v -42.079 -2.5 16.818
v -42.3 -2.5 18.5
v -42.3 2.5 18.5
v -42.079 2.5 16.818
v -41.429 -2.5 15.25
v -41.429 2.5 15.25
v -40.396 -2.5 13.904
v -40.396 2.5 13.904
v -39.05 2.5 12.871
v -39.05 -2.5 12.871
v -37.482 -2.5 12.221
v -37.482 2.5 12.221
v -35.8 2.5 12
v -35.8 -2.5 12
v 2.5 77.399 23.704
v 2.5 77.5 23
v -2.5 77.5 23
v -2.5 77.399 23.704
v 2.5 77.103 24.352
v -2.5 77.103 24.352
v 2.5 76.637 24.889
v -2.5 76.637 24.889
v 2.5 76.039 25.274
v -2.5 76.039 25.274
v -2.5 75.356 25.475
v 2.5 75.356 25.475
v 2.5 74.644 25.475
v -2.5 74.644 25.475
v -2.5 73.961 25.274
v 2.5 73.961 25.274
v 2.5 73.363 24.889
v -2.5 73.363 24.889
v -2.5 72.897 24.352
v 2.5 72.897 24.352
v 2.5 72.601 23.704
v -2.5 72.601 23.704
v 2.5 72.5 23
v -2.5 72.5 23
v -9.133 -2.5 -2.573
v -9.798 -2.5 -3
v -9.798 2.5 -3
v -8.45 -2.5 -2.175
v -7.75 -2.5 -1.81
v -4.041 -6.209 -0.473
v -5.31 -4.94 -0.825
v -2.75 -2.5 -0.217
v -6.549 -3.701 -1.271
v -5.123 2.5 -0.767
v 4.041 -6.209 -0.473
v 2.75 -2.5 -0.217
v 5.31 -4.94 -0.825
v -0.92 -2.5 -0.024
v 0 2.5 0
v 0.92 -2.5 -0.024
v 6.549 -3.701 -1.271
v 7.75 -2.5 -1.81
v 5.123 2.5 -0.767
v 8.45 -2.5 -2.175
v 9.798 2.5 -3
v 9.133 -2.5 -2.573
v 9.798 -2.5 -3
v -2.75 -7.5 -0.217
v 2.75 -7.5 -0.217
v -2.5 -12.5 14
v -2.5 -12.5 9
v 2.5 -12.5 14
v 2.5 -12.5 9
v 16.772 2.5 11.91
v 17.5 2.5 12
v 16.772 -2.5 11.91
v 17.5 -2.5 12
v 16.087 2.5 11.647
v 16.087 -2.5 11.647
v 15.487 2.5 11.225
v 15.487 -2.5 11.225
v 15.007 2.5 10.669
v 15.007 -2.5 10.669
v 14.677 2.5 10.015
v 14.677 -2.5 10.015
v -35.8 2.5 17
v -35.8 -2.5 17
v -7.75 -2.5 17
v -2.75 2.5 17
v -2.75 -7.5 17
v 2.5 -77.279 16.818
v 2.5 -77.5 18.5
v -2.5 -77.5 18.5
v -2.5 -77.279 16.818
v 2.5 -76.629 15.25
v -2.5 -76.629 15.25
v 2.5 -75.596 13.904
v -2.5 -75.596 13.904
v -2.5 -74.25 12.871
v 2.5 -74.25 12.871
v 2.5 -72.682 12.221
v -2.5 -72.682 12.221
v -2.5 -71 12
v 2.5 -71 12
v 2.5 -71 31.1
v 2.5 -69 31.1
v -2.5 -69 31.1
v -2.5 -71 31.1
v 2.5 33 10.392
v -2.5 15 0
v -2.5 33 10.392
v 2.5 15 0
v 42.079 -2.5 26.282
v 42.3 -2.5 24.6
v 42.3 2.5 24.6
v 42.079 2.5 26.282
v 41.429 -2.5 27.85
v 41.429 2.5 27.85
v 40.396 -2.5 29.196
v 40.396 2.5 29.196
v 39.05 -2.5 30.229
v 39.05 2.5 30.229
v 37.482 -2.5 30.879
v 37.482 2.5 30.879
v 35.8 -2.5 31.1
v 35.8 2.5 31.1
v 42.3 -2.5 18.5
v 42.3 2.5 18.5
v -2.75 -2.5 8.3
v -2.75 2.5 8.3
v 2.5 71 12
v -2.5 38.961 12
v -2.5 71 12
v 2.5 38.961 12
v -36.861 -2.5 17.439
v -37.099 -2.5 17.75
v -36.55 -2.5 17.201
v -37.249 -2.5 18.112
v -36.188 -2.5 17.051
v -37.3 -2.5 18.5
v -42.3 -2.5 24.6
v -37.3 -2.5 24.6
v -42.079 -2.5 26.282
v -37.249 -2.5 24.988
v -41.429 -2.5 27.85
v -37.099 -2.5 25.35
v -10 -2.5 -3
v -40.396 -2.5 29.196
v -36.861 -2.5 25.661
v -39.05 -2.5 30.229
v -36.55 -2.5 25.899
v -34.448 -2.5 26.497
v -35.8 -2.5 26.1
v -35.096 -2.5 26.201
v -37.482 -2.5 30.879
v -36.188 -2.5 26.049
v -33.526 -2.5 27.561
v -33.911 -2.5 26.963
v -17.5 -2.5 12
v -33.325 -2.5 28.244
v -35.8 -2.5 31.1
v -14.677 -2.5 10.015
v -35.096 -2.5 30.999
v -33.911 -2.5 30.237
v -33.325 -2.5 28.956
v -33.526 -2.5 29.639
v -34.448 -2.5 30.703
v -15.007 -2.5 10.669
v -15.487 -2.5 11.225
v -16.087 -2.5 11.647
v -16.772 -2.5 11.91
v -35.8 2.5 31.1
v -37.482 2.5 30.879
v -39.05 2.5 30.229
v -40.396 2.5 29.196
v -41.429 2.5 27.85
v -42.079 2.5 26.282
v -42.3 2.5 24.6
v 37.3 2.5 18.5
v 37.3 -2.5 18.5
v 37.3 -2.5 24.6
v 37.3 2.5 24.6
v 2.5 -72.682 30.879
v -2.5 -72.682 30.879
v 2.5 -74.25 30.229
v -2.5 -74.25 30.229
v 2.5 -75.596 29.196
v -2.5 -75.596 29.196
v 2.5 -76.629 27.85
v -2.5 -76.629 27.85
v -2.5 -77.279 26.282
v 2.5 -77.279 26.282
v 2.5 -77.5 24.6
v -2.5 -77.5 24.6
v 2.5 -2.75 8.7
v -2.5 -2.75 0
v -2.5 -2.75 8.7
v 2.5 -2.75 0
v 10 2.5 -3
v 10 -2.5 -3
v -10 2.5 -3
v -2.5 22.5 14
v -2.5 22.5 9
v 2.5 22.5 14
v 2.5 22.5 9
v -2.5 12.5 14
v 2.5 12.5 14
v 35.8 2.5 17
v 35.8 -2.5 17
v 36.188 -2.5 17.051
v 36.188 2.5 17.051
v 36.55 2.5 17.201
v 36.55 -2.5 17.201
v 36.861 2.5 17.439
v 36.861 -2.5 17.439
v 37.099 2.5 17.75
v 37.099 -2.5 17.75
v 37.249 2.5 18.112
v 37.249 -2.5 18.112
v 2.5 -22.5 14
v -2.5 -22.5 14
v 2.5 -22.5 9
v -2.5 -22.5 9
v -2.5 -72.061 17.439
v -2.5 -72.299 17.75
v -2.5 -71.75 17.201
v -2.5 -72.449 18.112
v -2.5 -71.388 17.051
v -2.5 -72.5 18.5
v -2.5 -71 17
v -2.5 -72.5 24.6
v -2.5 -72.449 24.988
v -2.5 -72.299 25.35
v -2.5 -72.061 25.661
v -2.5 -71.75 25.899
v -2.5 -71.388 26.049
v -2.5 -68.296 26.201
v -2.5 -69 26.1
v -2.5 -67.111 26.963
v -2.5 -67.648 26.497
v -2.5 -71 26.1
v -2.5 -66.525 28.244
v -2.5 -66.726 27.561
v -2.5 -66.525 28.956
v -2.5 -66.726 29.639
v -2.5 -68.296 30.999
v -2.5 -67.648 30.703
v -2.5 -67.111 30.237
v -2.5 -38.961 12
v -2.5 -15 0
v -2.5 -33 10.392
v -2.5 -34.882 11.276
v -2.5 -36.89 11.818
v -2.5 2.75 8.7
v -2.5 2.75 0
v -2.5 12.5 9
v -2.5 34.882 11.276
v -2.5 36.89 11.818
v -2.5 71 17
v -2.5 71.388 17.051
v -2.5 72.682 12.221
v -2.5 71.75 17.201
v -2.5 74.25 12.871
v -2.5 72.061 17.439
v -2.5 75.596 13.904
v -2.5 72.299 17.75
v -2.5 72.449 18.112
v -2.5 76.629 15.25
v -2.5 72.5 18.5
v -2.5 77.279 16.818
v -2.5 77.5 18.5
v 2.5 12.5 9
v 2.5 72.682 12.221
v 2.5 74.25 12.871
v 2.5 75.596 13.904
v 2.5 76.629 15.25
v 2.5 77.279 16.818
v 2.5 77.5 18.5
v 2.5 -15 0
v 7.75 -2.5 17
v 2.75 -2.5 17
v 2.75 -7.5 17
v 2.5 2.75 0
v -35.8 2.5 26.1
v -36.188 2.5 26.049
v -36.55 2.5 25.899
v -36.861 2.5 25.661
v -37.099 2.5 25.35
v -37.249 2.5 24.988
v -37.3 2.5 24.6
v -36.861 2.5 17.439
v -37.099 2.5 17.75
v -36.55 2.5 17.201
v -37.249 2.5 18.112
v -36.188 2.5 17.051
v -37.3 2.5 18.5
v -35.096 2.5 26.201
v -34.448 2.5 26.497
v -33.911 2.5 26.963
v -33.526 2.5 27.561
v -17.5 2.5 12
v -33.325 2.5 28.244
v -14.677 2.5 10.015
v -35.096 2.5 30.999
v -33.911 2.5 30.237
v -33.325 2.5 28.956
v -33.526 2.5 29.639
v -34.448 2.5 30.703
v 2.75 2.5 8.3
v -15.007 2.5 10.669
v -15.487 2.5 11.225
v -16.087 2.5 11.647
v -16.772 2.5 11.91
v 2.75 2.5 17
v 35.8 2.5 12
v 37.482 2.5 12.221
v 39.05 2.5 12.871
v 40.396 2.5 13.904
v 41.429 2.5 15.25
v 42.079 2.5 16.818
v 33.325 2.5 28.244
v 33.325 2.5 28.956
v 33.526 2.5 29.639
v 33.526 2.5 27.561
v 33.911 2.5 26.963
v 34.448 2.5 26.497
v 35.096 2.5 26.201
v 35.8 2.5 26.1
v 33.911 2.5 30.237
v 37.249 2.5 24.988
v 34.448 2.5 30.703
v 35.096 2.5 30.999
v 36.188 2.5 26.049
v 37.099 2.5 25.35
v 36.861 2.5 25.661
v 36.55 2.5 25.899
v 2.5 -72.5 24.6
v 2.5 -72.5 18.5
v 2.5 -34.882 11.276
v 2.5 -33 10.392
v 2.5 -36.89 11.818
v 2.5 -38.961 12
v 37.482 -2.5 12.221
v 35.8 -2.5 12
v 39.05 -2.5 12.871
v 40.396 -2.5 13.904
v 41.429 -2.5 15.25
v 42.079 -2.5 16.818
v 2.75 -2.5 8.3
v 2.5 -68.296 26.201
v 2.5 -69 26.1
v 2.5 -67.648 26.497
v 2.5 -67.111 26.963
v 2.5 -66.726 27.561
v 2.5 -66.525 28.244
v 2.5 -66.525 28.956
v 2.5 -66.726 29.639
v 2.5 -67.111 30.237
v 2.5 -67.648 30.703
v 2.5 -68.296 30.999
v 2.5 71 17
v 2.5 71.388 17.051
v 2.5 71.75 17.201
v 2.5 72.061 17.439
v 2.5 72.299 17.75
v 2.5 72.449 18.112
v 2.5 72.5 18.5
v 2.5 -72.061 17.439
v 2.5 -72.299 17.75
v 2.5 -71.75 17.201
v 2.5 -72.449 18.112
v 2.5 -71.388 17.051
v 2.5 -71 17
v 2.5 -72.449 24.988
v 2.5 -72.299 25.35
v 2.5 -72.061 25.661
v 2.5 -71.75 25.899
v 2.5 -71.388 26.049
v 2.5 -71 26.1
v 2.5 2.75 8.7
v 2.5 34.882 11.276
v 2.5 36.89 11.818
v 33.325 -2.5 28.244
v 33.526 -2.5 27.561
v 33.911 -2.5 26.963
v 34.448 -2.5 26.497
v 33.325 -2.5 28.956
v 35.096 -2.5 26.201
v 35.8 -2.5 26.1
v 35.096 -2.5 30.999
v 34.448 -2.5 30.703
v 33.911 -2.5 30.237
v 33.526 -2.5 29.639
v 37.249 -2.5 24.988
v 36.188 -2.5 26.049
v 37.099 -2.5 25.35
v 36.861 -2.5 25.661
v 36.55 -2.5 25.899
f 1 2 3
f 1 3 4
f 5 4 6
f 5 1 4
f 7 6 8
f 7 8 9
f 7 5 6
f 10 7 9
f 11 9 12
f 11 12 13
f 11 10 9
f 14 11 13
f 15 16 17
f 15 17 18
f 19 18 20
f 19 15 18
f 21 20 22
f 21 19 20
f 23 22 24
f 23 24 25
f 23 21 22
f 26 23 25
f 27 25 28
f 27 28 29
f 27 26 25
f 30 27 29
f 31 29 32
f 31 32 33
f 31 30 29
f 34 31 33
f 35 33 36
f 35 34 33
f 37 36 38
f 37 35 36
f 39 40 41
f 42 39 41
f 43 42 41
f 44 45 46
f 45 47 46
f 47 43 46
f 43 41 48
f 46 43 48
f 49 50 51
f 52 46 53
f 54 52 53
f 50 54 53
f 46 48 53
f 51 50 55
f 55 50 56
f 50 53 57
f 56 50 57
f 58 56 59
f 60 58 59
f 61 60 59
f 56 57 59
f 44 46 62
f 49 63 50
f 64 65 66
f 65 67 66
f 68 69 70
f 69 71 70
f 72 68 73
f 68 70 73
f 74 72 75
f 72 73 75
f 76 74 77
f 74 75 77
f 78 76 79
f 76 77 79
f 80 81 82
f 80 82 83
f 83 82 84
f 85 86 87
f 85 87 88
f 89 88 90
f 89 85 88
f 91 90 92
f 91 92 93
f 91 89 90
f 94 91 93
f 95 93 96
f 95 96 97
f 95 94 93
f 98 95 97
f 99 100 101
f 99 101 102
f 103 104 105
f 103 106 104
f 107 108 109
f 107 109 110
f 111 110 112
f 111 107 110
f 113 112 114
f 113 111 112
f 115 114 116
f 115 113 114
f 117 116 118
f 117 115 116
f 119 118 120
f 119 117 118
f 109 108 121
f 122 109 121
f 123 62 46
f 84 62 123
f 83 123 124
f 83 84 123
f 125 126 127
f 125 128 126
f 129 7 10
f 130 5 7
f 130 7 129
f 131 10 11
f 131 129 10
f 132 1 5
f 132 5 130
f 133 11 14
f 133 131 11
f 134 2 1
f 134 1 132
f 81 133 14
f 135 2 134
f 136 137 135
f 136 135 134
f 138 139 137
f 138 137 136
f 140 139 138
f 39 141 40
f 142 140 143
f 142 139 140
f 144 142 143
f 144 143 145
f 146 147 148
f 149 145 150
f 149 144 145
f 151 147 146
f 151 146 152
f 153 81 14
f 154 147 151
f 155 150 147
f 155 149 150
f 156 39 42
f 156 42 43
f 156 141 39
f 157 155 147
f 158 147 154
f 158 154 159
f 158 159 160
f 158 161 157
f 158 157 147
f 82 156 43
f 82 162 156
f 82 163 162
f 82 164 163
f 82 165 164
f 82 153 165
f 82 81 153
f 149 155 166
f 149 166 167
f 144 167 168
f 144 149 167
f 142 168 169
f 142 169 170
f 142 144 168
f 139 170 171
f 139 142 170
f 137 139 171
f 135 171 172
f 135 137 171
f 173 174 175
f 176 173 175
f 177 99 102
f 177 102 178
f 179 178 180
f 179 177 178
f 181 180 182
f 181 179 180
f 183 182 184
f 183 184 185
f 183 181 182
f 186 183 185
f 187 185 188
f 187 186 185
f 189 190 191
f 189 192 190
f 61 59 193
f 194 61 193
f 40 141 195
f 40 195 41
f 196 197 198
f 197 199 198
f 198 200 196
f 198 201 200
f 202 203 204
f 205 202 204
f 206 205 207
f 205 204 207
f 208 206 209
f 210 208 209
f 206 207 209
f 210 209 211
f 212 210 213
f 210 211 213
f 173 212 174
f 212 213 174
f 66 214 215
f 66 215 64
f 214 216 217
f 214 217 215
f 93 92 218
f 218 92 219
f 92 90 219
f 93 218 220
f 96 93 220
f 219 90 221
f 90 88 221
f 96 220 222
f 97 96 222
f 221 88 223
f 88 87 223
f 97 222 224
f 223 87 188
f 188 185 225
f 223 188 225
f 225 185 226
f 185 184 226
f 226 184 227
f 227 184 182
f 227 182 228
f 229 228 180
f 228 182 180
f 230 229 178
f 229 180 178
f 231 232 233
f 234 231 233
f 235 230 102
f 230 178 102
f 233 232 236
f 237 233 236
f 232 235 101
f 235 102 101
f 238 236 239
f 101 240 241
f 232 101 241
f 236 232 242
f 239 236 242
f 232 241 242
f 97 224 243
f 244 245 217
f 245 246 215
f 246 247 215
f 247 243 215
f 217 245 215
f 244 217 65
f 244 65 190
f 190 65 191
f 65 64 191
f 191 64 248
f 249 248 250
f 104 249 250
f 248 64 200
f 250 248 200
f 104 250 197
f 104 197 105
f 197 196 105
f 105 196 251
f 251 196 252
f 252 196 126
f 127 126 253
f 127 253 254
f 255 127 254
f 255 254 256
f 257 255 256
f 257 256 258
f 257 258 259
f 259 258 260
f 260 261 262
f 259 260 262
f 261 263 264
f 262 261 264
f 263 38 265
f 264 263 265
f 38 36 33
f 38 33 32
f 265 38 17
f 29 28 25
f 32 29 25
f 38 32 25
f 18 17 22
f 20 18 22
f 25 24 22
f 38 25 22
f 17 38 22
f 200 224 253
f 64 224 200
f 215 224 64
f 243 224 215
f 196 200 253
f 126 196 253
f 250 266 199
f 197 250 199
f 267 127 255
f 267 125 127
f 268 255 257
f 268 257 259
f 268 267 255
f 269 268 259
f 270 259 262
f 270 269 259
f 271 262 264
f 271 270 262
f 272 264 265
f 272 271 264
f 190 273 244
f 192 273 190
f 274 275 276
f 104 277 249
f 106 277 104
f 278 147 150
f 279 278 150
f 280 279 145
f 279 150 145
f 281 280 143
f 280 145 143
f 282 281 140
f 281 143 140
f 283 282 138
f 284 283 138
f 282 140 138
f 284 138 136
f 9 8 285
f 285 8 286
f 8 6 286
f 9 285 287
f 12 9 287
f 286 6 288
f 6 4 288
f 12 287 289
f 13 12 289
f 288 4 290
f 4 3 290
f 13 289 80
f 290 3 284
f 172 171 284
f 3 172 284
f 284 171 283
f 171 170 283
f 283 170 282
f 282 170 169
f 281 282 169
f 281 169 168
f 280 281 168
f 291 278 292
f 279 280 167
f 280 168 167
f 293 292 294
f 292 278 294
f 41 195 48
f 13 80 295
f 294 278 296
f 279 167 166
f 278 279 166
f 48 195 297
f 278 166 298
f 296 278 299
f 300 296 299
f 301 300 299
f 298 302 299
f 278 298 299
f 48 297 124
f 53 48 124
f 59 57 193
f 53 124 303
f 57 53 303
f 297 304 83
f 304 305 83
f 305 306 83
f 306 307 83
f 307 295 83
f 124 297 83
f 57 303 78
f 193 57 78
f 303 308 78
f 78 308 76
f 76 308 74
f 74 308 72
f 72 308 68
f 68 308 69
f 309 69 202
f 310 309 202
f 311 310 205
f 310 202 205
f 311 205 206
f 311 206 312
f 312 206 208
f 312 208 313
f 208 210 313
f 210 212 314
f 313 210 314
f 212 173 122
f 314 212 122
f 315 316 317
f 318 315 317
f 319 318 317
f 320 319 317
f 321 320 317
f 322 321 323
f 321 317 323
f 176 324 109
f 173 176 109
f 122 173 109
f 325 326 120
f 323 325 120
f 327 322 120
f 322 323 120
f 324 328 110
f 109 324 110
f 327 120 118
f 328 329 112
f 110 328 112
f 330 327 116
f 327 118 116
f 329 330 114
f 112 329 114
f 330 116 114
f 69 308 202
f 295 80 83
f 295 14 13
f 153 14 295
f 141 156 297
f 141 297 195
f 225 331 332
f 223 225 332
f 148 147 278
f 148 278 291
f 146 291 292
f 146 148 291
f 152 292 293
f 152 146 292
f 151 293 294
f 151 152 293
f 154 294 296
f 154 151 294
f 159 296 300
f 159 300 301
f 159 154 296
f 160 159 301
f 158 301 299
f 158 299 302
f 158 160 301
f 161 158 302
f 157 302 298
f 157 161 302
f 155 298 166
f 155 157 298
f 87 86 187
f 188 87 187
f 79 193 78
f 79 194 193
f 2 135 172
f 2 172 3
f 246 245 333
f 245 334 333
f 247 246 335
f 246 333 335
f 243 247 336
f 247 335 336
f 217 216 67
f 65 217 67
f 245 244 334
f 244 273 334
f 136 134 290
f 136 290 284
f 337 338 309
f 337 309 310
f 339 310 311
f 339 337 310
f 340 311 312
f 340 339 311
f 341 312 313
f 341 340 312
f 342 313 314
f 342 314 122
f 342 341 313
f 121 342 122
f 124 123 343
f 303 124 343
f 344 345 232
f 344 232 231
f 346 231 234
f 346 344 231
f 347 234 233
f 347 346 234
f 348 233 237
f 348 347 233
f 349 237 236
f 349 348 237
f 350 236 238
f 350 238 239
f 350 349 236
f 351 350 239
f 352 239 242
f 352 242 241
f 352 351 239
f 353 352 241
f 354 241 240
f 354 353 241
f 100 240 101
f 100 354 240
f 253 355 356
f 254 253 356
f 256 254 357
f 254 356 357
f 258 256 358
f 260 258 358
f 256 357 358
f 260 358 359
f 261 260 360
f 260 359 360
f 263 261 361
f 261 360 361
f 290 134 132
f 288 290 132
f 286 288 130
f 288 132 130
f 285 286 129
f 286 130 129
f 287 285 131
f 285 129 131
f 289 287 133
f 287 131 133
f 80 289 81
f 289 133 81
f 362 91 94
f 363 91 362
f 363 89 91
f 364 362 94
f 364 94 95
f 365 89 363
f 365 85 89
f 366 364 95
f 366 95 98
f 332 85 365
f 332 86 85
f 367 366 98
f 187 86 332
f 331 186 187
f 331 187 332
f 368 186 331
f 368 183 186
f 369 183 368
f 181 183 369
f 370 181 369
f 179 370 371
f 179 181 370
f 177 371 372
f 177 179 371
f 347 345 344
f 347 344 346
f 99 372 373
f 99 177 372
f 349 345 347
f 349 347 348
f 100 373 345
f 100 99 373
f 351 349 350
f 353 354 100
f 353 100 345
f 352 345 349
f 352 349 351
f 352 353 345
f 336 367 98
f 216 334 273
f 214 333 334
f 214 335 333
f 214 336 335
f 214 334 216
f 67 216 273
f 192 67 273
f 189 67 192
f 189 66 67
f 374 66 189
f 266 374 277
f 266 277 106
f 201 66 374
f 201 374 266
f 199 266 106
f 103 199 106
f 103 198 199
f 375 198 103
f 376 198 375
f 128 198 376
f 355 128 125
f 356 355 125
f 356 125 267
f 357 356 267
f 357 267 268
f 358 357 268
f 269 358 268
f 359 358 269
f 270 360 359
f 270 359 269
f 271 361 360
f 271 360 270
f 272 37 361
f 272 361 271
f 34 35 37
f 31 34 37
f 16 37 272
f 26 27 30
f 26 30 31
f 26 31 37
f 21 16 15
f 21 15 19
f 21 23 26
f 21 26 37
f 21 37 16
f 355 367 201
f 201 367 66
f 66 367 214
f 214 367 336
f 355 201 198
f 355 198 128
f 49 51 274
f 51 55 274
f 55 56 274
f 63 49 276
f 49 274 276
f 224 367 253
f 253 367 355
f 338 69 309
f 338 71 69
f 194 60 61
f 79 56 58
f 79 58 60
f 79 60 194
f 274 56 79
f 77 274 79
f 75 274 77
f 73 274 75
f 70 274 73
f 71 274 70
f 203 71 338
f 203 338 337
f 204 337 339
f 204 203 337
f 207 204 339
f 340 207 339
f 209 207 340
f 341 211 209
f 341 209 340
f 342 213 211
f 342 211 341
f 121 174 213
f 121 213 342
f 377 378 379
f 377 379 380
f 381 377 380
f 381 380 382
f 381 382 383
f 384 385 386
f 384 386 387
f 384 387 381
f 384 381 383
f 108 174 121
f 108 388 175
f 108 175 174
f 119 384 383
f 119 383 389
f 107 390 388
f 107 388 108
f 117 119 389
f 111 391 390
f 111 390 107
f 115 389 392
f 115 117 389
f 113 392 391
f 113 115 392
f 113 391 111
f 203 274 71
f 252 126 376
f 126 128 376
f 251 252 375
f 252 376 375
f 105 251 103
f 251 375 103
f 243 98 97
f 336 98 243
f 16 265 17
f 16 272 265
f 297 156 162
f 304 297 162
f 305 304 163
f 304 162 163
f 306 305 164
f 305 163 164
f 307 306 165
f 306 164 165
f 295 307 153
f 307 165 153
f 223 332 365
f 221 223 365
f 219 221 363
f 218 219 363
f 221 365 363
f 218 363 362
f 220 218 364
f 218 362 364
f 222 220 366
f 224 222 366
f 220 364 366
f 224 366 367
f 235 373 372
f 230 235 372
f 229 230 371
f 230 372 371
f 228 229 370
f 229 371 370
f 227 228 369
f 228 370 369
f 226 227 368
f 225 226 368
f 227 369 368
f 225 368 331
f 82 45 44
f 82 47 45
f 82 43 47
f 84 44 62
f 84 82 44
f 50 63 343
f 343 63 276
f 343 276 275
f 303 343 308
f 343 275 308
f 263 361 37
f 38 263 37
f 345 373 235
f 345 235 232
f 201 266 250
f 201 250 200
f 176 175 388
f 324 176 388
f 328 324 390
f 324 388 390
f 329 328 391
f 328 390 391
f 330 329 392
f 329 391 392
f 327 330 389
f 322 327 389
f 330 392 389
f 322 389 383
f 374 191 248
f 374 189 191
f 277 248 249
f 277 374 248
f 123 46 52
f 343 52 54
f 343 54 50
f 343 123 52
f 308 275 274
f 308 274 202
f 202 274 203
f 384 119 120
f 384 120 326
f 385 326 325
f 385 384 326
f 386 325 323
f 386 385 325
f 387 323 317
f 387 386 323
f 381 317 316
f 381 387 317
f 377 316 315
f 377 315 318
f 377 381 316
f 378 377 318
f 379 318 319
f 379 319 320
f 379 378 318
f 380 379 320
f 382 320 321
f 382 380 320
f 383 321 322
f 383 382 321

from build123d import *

# Parameters (mm, degrees)
SKETCH_W     = 10
SKETCH_H     = 5
PAD_DEPTH    = 2.5
PAD001_DEPTH = 2.5
PAD002_DEPTH = 20
POCKET_DEPTH = 10


with BuildPart() as vertical:
    # Sketch → Pad (new body, symmetric)
    with BuildSketch(Plane.YZ):
        with BuildLine():
            Line((77.5, 18.5), (77.5, 22.999992))
            ThreePointArc((77.5, 22.999992), (75.000004, 25.499992), (72.5, 23))
            Line((72.5, 18.499986), (72.5, 23))
            ThreePointArc((70.999998, 17), (72.060654, 17.439335), (72.5, 18.499986))
            Line((-70.999999, 17), (70.999998, 17))
            ThreePointArc((-72.5, 18.499986), (-72.060655, 17.439335), (-70.999999, 17))
            Line((-72.5, 24.600015), (-72.5, 18.499986))
            ThreePointArc((-70.999999, 26.1), (-72.060655, 25.660666), (-72.5, 24.600015))
            Line((-70.999999, 26.1), (-68.999999, 26.1))
            ThreePointArc((-68.999999, 26.1), (-66.499999, 28.6), (-68.999999, 31.1))
            Line((-68.999999, 31.1), (-71, 31.1))
            ThreePointArc((-71, 31.1), (-75.596194, 29.196194), (-77.5, 24.600001))
            Line((-77.5, 18.499986), (-77.5, 24.600001))
            ThreePointArc((-77.5, 18.499986), (-75.596189, 13.903801), (-71.000001, 12))
            Line((-71.000001, 12), (-38.960757, 12))
            ThreePointArc((-33, 10.392302), (-35.873877, 11.59102), (-38.960757, 12))
            Line((-15, 0), (-33, 10.392302))
            Line((-15, 0), (-2.75, 0))
            Line((-2.75, 0), (-2.75, 8.7))
            Line((-2.75, 8.7), (2.75, 8.7))
            Line((2.75, 8.7), (2.75, 0))
            Line((2.75, 0), (15, 0))
            Line((15, 0), (33, 10.392302))
            ThreePointArc((38.960757, 12), (35.873877, 11.59102), (33, 10.392302))
            Line((38.960757, 12), (71, 12))
            ThreePointArc((71, 12), (75.596194, 13.903806), (77.5, 18.5))
        make_face()
        with Locations((-17.5, 11.5)):
            Rectangle(SKETCH_W, SKETCH_H, mode=Mode.SUBTRACT)
        with Locations((17.5, 11.5)):
            Rectangle(SKETCH_W, SKETCH_H, mode=Mode.SUBTRACT)
    extrude(amount=PAD_DEPTH, both=True)


with BuildPart() as fusion:
    # Sketch001 → Pad001 (new body, symmetric)
    with BuildSketch(Plane.XZ):
        with BuildLine():
            Line((17.5, 12.000014), (35.799994, 12))
            ThreePointArc((35.799994, 12), (40.396192, 13.903804), (42.3, 18.500001))
            Line((42.3, 24.600026), (42.3, 18.500001))
            ThreePointArc((42.3, 24.600026), (40.396194, 29.196222), (35.799999, 31.100028))
            ThreePointArc((35.799999, 31.100028), (33.299999, 28.600028), (35.799999, 26.100028))
            ThreePointArc((37.3, 24.600026), (36.86066, 25.660688), (35.799999, 26.100028))
            Line((37.3, 18.500001), (37.3, 24.600026))
            ThreePointArc((35.799999, 17), (36.86066, 17.43934), (37.3, 18.500001))
            Line((2.75, 17), (35.799999, 17))
            Line((2.75, 8.3), (2.75, 17))
            Line((-2.75, 8.3), (2.75, 8.3))
            Line((-2.75, 17.000014), (-2.75, 8.3))
            Line((-35.8, 17.000014), (-2.75, 17.000014))
            ThreePointArc((-37.3, 18.500001), (-36.860656, 17.439349), (-35.8, 17.000014))
            Line((-37.3, 18.500001), (-37.3, 24.600026))
            ThreePointArc((-35.799999, 26.100014), (-36.860655, 25.660679), (-37.3, 24.600026))
            ThreePointArc((-35.799999, 26.100014), (-33.299999, 28.600014), (-35.799999, 31.100014))
            ThreePointArc((-35.799999, 31.100014), (-40.396189, 29.196213), (-42.3, 24.600026))
            Line((-42.3, 24.600026), (-42.3, 18.500001))
            ThreePointArc((-42.3, 18.500001), (-40.396189, 13.903815), (-35.799999, 12.000014))
            Line((-35.799999, 12.000014), (-17.5, 12.000014))
            ThreePointArc((-14.676752, 10.014543), (-15.774252, 11.453948), (-17.5, 12.000014))
            Line((-14.676752, 10.014543), (-10, -3))
            Line((-10, -3), (10, -3))
            Line((10, -3), (14.676746, 10.014542))
            ThreePointArc((17.5, 12.000014), (15.774248, 11.45395), (14.676746, 10.014542))
        make_face()
    extrude(amount=PAD001_DEPTH, both=True)

    # Sketch002 → Pad002 (new body)
    with BuildSketch(Plane(origin=(0, 0, 17.000014), x_dir=(-1, 0, 0), z_dir=(0, 0, 1))):
        Polygon((-7.75, 2.5), (-2.75, 7.5), (-2.75, 2.5), align=None)
        Polygon((2.75, 7.5), (2.75, 2.5), (7.75, 2.5), align=None)
    extrude(amount=-PAD002_DEPTH)

    # Sketch003 → Pocket (cut)
    with BuildSketch(Plane(origin=(0, 2.5, 0), x_dir=(1, 0, 0), z_dir=(0, 1, 0))):
        with BuildLine():
            ThreePointArc((-10, 3.138593), (0, 0), (10, 3.138593))
            Line((-10, 3.138593), (10, 3.138593))
        make_face()
    extrude(amount=-POCKET_DEPTH, mode=Mode.SUBTRACT)

    # Fusion: union Vertical
    add(vertical.part)


solid = fusion.part
